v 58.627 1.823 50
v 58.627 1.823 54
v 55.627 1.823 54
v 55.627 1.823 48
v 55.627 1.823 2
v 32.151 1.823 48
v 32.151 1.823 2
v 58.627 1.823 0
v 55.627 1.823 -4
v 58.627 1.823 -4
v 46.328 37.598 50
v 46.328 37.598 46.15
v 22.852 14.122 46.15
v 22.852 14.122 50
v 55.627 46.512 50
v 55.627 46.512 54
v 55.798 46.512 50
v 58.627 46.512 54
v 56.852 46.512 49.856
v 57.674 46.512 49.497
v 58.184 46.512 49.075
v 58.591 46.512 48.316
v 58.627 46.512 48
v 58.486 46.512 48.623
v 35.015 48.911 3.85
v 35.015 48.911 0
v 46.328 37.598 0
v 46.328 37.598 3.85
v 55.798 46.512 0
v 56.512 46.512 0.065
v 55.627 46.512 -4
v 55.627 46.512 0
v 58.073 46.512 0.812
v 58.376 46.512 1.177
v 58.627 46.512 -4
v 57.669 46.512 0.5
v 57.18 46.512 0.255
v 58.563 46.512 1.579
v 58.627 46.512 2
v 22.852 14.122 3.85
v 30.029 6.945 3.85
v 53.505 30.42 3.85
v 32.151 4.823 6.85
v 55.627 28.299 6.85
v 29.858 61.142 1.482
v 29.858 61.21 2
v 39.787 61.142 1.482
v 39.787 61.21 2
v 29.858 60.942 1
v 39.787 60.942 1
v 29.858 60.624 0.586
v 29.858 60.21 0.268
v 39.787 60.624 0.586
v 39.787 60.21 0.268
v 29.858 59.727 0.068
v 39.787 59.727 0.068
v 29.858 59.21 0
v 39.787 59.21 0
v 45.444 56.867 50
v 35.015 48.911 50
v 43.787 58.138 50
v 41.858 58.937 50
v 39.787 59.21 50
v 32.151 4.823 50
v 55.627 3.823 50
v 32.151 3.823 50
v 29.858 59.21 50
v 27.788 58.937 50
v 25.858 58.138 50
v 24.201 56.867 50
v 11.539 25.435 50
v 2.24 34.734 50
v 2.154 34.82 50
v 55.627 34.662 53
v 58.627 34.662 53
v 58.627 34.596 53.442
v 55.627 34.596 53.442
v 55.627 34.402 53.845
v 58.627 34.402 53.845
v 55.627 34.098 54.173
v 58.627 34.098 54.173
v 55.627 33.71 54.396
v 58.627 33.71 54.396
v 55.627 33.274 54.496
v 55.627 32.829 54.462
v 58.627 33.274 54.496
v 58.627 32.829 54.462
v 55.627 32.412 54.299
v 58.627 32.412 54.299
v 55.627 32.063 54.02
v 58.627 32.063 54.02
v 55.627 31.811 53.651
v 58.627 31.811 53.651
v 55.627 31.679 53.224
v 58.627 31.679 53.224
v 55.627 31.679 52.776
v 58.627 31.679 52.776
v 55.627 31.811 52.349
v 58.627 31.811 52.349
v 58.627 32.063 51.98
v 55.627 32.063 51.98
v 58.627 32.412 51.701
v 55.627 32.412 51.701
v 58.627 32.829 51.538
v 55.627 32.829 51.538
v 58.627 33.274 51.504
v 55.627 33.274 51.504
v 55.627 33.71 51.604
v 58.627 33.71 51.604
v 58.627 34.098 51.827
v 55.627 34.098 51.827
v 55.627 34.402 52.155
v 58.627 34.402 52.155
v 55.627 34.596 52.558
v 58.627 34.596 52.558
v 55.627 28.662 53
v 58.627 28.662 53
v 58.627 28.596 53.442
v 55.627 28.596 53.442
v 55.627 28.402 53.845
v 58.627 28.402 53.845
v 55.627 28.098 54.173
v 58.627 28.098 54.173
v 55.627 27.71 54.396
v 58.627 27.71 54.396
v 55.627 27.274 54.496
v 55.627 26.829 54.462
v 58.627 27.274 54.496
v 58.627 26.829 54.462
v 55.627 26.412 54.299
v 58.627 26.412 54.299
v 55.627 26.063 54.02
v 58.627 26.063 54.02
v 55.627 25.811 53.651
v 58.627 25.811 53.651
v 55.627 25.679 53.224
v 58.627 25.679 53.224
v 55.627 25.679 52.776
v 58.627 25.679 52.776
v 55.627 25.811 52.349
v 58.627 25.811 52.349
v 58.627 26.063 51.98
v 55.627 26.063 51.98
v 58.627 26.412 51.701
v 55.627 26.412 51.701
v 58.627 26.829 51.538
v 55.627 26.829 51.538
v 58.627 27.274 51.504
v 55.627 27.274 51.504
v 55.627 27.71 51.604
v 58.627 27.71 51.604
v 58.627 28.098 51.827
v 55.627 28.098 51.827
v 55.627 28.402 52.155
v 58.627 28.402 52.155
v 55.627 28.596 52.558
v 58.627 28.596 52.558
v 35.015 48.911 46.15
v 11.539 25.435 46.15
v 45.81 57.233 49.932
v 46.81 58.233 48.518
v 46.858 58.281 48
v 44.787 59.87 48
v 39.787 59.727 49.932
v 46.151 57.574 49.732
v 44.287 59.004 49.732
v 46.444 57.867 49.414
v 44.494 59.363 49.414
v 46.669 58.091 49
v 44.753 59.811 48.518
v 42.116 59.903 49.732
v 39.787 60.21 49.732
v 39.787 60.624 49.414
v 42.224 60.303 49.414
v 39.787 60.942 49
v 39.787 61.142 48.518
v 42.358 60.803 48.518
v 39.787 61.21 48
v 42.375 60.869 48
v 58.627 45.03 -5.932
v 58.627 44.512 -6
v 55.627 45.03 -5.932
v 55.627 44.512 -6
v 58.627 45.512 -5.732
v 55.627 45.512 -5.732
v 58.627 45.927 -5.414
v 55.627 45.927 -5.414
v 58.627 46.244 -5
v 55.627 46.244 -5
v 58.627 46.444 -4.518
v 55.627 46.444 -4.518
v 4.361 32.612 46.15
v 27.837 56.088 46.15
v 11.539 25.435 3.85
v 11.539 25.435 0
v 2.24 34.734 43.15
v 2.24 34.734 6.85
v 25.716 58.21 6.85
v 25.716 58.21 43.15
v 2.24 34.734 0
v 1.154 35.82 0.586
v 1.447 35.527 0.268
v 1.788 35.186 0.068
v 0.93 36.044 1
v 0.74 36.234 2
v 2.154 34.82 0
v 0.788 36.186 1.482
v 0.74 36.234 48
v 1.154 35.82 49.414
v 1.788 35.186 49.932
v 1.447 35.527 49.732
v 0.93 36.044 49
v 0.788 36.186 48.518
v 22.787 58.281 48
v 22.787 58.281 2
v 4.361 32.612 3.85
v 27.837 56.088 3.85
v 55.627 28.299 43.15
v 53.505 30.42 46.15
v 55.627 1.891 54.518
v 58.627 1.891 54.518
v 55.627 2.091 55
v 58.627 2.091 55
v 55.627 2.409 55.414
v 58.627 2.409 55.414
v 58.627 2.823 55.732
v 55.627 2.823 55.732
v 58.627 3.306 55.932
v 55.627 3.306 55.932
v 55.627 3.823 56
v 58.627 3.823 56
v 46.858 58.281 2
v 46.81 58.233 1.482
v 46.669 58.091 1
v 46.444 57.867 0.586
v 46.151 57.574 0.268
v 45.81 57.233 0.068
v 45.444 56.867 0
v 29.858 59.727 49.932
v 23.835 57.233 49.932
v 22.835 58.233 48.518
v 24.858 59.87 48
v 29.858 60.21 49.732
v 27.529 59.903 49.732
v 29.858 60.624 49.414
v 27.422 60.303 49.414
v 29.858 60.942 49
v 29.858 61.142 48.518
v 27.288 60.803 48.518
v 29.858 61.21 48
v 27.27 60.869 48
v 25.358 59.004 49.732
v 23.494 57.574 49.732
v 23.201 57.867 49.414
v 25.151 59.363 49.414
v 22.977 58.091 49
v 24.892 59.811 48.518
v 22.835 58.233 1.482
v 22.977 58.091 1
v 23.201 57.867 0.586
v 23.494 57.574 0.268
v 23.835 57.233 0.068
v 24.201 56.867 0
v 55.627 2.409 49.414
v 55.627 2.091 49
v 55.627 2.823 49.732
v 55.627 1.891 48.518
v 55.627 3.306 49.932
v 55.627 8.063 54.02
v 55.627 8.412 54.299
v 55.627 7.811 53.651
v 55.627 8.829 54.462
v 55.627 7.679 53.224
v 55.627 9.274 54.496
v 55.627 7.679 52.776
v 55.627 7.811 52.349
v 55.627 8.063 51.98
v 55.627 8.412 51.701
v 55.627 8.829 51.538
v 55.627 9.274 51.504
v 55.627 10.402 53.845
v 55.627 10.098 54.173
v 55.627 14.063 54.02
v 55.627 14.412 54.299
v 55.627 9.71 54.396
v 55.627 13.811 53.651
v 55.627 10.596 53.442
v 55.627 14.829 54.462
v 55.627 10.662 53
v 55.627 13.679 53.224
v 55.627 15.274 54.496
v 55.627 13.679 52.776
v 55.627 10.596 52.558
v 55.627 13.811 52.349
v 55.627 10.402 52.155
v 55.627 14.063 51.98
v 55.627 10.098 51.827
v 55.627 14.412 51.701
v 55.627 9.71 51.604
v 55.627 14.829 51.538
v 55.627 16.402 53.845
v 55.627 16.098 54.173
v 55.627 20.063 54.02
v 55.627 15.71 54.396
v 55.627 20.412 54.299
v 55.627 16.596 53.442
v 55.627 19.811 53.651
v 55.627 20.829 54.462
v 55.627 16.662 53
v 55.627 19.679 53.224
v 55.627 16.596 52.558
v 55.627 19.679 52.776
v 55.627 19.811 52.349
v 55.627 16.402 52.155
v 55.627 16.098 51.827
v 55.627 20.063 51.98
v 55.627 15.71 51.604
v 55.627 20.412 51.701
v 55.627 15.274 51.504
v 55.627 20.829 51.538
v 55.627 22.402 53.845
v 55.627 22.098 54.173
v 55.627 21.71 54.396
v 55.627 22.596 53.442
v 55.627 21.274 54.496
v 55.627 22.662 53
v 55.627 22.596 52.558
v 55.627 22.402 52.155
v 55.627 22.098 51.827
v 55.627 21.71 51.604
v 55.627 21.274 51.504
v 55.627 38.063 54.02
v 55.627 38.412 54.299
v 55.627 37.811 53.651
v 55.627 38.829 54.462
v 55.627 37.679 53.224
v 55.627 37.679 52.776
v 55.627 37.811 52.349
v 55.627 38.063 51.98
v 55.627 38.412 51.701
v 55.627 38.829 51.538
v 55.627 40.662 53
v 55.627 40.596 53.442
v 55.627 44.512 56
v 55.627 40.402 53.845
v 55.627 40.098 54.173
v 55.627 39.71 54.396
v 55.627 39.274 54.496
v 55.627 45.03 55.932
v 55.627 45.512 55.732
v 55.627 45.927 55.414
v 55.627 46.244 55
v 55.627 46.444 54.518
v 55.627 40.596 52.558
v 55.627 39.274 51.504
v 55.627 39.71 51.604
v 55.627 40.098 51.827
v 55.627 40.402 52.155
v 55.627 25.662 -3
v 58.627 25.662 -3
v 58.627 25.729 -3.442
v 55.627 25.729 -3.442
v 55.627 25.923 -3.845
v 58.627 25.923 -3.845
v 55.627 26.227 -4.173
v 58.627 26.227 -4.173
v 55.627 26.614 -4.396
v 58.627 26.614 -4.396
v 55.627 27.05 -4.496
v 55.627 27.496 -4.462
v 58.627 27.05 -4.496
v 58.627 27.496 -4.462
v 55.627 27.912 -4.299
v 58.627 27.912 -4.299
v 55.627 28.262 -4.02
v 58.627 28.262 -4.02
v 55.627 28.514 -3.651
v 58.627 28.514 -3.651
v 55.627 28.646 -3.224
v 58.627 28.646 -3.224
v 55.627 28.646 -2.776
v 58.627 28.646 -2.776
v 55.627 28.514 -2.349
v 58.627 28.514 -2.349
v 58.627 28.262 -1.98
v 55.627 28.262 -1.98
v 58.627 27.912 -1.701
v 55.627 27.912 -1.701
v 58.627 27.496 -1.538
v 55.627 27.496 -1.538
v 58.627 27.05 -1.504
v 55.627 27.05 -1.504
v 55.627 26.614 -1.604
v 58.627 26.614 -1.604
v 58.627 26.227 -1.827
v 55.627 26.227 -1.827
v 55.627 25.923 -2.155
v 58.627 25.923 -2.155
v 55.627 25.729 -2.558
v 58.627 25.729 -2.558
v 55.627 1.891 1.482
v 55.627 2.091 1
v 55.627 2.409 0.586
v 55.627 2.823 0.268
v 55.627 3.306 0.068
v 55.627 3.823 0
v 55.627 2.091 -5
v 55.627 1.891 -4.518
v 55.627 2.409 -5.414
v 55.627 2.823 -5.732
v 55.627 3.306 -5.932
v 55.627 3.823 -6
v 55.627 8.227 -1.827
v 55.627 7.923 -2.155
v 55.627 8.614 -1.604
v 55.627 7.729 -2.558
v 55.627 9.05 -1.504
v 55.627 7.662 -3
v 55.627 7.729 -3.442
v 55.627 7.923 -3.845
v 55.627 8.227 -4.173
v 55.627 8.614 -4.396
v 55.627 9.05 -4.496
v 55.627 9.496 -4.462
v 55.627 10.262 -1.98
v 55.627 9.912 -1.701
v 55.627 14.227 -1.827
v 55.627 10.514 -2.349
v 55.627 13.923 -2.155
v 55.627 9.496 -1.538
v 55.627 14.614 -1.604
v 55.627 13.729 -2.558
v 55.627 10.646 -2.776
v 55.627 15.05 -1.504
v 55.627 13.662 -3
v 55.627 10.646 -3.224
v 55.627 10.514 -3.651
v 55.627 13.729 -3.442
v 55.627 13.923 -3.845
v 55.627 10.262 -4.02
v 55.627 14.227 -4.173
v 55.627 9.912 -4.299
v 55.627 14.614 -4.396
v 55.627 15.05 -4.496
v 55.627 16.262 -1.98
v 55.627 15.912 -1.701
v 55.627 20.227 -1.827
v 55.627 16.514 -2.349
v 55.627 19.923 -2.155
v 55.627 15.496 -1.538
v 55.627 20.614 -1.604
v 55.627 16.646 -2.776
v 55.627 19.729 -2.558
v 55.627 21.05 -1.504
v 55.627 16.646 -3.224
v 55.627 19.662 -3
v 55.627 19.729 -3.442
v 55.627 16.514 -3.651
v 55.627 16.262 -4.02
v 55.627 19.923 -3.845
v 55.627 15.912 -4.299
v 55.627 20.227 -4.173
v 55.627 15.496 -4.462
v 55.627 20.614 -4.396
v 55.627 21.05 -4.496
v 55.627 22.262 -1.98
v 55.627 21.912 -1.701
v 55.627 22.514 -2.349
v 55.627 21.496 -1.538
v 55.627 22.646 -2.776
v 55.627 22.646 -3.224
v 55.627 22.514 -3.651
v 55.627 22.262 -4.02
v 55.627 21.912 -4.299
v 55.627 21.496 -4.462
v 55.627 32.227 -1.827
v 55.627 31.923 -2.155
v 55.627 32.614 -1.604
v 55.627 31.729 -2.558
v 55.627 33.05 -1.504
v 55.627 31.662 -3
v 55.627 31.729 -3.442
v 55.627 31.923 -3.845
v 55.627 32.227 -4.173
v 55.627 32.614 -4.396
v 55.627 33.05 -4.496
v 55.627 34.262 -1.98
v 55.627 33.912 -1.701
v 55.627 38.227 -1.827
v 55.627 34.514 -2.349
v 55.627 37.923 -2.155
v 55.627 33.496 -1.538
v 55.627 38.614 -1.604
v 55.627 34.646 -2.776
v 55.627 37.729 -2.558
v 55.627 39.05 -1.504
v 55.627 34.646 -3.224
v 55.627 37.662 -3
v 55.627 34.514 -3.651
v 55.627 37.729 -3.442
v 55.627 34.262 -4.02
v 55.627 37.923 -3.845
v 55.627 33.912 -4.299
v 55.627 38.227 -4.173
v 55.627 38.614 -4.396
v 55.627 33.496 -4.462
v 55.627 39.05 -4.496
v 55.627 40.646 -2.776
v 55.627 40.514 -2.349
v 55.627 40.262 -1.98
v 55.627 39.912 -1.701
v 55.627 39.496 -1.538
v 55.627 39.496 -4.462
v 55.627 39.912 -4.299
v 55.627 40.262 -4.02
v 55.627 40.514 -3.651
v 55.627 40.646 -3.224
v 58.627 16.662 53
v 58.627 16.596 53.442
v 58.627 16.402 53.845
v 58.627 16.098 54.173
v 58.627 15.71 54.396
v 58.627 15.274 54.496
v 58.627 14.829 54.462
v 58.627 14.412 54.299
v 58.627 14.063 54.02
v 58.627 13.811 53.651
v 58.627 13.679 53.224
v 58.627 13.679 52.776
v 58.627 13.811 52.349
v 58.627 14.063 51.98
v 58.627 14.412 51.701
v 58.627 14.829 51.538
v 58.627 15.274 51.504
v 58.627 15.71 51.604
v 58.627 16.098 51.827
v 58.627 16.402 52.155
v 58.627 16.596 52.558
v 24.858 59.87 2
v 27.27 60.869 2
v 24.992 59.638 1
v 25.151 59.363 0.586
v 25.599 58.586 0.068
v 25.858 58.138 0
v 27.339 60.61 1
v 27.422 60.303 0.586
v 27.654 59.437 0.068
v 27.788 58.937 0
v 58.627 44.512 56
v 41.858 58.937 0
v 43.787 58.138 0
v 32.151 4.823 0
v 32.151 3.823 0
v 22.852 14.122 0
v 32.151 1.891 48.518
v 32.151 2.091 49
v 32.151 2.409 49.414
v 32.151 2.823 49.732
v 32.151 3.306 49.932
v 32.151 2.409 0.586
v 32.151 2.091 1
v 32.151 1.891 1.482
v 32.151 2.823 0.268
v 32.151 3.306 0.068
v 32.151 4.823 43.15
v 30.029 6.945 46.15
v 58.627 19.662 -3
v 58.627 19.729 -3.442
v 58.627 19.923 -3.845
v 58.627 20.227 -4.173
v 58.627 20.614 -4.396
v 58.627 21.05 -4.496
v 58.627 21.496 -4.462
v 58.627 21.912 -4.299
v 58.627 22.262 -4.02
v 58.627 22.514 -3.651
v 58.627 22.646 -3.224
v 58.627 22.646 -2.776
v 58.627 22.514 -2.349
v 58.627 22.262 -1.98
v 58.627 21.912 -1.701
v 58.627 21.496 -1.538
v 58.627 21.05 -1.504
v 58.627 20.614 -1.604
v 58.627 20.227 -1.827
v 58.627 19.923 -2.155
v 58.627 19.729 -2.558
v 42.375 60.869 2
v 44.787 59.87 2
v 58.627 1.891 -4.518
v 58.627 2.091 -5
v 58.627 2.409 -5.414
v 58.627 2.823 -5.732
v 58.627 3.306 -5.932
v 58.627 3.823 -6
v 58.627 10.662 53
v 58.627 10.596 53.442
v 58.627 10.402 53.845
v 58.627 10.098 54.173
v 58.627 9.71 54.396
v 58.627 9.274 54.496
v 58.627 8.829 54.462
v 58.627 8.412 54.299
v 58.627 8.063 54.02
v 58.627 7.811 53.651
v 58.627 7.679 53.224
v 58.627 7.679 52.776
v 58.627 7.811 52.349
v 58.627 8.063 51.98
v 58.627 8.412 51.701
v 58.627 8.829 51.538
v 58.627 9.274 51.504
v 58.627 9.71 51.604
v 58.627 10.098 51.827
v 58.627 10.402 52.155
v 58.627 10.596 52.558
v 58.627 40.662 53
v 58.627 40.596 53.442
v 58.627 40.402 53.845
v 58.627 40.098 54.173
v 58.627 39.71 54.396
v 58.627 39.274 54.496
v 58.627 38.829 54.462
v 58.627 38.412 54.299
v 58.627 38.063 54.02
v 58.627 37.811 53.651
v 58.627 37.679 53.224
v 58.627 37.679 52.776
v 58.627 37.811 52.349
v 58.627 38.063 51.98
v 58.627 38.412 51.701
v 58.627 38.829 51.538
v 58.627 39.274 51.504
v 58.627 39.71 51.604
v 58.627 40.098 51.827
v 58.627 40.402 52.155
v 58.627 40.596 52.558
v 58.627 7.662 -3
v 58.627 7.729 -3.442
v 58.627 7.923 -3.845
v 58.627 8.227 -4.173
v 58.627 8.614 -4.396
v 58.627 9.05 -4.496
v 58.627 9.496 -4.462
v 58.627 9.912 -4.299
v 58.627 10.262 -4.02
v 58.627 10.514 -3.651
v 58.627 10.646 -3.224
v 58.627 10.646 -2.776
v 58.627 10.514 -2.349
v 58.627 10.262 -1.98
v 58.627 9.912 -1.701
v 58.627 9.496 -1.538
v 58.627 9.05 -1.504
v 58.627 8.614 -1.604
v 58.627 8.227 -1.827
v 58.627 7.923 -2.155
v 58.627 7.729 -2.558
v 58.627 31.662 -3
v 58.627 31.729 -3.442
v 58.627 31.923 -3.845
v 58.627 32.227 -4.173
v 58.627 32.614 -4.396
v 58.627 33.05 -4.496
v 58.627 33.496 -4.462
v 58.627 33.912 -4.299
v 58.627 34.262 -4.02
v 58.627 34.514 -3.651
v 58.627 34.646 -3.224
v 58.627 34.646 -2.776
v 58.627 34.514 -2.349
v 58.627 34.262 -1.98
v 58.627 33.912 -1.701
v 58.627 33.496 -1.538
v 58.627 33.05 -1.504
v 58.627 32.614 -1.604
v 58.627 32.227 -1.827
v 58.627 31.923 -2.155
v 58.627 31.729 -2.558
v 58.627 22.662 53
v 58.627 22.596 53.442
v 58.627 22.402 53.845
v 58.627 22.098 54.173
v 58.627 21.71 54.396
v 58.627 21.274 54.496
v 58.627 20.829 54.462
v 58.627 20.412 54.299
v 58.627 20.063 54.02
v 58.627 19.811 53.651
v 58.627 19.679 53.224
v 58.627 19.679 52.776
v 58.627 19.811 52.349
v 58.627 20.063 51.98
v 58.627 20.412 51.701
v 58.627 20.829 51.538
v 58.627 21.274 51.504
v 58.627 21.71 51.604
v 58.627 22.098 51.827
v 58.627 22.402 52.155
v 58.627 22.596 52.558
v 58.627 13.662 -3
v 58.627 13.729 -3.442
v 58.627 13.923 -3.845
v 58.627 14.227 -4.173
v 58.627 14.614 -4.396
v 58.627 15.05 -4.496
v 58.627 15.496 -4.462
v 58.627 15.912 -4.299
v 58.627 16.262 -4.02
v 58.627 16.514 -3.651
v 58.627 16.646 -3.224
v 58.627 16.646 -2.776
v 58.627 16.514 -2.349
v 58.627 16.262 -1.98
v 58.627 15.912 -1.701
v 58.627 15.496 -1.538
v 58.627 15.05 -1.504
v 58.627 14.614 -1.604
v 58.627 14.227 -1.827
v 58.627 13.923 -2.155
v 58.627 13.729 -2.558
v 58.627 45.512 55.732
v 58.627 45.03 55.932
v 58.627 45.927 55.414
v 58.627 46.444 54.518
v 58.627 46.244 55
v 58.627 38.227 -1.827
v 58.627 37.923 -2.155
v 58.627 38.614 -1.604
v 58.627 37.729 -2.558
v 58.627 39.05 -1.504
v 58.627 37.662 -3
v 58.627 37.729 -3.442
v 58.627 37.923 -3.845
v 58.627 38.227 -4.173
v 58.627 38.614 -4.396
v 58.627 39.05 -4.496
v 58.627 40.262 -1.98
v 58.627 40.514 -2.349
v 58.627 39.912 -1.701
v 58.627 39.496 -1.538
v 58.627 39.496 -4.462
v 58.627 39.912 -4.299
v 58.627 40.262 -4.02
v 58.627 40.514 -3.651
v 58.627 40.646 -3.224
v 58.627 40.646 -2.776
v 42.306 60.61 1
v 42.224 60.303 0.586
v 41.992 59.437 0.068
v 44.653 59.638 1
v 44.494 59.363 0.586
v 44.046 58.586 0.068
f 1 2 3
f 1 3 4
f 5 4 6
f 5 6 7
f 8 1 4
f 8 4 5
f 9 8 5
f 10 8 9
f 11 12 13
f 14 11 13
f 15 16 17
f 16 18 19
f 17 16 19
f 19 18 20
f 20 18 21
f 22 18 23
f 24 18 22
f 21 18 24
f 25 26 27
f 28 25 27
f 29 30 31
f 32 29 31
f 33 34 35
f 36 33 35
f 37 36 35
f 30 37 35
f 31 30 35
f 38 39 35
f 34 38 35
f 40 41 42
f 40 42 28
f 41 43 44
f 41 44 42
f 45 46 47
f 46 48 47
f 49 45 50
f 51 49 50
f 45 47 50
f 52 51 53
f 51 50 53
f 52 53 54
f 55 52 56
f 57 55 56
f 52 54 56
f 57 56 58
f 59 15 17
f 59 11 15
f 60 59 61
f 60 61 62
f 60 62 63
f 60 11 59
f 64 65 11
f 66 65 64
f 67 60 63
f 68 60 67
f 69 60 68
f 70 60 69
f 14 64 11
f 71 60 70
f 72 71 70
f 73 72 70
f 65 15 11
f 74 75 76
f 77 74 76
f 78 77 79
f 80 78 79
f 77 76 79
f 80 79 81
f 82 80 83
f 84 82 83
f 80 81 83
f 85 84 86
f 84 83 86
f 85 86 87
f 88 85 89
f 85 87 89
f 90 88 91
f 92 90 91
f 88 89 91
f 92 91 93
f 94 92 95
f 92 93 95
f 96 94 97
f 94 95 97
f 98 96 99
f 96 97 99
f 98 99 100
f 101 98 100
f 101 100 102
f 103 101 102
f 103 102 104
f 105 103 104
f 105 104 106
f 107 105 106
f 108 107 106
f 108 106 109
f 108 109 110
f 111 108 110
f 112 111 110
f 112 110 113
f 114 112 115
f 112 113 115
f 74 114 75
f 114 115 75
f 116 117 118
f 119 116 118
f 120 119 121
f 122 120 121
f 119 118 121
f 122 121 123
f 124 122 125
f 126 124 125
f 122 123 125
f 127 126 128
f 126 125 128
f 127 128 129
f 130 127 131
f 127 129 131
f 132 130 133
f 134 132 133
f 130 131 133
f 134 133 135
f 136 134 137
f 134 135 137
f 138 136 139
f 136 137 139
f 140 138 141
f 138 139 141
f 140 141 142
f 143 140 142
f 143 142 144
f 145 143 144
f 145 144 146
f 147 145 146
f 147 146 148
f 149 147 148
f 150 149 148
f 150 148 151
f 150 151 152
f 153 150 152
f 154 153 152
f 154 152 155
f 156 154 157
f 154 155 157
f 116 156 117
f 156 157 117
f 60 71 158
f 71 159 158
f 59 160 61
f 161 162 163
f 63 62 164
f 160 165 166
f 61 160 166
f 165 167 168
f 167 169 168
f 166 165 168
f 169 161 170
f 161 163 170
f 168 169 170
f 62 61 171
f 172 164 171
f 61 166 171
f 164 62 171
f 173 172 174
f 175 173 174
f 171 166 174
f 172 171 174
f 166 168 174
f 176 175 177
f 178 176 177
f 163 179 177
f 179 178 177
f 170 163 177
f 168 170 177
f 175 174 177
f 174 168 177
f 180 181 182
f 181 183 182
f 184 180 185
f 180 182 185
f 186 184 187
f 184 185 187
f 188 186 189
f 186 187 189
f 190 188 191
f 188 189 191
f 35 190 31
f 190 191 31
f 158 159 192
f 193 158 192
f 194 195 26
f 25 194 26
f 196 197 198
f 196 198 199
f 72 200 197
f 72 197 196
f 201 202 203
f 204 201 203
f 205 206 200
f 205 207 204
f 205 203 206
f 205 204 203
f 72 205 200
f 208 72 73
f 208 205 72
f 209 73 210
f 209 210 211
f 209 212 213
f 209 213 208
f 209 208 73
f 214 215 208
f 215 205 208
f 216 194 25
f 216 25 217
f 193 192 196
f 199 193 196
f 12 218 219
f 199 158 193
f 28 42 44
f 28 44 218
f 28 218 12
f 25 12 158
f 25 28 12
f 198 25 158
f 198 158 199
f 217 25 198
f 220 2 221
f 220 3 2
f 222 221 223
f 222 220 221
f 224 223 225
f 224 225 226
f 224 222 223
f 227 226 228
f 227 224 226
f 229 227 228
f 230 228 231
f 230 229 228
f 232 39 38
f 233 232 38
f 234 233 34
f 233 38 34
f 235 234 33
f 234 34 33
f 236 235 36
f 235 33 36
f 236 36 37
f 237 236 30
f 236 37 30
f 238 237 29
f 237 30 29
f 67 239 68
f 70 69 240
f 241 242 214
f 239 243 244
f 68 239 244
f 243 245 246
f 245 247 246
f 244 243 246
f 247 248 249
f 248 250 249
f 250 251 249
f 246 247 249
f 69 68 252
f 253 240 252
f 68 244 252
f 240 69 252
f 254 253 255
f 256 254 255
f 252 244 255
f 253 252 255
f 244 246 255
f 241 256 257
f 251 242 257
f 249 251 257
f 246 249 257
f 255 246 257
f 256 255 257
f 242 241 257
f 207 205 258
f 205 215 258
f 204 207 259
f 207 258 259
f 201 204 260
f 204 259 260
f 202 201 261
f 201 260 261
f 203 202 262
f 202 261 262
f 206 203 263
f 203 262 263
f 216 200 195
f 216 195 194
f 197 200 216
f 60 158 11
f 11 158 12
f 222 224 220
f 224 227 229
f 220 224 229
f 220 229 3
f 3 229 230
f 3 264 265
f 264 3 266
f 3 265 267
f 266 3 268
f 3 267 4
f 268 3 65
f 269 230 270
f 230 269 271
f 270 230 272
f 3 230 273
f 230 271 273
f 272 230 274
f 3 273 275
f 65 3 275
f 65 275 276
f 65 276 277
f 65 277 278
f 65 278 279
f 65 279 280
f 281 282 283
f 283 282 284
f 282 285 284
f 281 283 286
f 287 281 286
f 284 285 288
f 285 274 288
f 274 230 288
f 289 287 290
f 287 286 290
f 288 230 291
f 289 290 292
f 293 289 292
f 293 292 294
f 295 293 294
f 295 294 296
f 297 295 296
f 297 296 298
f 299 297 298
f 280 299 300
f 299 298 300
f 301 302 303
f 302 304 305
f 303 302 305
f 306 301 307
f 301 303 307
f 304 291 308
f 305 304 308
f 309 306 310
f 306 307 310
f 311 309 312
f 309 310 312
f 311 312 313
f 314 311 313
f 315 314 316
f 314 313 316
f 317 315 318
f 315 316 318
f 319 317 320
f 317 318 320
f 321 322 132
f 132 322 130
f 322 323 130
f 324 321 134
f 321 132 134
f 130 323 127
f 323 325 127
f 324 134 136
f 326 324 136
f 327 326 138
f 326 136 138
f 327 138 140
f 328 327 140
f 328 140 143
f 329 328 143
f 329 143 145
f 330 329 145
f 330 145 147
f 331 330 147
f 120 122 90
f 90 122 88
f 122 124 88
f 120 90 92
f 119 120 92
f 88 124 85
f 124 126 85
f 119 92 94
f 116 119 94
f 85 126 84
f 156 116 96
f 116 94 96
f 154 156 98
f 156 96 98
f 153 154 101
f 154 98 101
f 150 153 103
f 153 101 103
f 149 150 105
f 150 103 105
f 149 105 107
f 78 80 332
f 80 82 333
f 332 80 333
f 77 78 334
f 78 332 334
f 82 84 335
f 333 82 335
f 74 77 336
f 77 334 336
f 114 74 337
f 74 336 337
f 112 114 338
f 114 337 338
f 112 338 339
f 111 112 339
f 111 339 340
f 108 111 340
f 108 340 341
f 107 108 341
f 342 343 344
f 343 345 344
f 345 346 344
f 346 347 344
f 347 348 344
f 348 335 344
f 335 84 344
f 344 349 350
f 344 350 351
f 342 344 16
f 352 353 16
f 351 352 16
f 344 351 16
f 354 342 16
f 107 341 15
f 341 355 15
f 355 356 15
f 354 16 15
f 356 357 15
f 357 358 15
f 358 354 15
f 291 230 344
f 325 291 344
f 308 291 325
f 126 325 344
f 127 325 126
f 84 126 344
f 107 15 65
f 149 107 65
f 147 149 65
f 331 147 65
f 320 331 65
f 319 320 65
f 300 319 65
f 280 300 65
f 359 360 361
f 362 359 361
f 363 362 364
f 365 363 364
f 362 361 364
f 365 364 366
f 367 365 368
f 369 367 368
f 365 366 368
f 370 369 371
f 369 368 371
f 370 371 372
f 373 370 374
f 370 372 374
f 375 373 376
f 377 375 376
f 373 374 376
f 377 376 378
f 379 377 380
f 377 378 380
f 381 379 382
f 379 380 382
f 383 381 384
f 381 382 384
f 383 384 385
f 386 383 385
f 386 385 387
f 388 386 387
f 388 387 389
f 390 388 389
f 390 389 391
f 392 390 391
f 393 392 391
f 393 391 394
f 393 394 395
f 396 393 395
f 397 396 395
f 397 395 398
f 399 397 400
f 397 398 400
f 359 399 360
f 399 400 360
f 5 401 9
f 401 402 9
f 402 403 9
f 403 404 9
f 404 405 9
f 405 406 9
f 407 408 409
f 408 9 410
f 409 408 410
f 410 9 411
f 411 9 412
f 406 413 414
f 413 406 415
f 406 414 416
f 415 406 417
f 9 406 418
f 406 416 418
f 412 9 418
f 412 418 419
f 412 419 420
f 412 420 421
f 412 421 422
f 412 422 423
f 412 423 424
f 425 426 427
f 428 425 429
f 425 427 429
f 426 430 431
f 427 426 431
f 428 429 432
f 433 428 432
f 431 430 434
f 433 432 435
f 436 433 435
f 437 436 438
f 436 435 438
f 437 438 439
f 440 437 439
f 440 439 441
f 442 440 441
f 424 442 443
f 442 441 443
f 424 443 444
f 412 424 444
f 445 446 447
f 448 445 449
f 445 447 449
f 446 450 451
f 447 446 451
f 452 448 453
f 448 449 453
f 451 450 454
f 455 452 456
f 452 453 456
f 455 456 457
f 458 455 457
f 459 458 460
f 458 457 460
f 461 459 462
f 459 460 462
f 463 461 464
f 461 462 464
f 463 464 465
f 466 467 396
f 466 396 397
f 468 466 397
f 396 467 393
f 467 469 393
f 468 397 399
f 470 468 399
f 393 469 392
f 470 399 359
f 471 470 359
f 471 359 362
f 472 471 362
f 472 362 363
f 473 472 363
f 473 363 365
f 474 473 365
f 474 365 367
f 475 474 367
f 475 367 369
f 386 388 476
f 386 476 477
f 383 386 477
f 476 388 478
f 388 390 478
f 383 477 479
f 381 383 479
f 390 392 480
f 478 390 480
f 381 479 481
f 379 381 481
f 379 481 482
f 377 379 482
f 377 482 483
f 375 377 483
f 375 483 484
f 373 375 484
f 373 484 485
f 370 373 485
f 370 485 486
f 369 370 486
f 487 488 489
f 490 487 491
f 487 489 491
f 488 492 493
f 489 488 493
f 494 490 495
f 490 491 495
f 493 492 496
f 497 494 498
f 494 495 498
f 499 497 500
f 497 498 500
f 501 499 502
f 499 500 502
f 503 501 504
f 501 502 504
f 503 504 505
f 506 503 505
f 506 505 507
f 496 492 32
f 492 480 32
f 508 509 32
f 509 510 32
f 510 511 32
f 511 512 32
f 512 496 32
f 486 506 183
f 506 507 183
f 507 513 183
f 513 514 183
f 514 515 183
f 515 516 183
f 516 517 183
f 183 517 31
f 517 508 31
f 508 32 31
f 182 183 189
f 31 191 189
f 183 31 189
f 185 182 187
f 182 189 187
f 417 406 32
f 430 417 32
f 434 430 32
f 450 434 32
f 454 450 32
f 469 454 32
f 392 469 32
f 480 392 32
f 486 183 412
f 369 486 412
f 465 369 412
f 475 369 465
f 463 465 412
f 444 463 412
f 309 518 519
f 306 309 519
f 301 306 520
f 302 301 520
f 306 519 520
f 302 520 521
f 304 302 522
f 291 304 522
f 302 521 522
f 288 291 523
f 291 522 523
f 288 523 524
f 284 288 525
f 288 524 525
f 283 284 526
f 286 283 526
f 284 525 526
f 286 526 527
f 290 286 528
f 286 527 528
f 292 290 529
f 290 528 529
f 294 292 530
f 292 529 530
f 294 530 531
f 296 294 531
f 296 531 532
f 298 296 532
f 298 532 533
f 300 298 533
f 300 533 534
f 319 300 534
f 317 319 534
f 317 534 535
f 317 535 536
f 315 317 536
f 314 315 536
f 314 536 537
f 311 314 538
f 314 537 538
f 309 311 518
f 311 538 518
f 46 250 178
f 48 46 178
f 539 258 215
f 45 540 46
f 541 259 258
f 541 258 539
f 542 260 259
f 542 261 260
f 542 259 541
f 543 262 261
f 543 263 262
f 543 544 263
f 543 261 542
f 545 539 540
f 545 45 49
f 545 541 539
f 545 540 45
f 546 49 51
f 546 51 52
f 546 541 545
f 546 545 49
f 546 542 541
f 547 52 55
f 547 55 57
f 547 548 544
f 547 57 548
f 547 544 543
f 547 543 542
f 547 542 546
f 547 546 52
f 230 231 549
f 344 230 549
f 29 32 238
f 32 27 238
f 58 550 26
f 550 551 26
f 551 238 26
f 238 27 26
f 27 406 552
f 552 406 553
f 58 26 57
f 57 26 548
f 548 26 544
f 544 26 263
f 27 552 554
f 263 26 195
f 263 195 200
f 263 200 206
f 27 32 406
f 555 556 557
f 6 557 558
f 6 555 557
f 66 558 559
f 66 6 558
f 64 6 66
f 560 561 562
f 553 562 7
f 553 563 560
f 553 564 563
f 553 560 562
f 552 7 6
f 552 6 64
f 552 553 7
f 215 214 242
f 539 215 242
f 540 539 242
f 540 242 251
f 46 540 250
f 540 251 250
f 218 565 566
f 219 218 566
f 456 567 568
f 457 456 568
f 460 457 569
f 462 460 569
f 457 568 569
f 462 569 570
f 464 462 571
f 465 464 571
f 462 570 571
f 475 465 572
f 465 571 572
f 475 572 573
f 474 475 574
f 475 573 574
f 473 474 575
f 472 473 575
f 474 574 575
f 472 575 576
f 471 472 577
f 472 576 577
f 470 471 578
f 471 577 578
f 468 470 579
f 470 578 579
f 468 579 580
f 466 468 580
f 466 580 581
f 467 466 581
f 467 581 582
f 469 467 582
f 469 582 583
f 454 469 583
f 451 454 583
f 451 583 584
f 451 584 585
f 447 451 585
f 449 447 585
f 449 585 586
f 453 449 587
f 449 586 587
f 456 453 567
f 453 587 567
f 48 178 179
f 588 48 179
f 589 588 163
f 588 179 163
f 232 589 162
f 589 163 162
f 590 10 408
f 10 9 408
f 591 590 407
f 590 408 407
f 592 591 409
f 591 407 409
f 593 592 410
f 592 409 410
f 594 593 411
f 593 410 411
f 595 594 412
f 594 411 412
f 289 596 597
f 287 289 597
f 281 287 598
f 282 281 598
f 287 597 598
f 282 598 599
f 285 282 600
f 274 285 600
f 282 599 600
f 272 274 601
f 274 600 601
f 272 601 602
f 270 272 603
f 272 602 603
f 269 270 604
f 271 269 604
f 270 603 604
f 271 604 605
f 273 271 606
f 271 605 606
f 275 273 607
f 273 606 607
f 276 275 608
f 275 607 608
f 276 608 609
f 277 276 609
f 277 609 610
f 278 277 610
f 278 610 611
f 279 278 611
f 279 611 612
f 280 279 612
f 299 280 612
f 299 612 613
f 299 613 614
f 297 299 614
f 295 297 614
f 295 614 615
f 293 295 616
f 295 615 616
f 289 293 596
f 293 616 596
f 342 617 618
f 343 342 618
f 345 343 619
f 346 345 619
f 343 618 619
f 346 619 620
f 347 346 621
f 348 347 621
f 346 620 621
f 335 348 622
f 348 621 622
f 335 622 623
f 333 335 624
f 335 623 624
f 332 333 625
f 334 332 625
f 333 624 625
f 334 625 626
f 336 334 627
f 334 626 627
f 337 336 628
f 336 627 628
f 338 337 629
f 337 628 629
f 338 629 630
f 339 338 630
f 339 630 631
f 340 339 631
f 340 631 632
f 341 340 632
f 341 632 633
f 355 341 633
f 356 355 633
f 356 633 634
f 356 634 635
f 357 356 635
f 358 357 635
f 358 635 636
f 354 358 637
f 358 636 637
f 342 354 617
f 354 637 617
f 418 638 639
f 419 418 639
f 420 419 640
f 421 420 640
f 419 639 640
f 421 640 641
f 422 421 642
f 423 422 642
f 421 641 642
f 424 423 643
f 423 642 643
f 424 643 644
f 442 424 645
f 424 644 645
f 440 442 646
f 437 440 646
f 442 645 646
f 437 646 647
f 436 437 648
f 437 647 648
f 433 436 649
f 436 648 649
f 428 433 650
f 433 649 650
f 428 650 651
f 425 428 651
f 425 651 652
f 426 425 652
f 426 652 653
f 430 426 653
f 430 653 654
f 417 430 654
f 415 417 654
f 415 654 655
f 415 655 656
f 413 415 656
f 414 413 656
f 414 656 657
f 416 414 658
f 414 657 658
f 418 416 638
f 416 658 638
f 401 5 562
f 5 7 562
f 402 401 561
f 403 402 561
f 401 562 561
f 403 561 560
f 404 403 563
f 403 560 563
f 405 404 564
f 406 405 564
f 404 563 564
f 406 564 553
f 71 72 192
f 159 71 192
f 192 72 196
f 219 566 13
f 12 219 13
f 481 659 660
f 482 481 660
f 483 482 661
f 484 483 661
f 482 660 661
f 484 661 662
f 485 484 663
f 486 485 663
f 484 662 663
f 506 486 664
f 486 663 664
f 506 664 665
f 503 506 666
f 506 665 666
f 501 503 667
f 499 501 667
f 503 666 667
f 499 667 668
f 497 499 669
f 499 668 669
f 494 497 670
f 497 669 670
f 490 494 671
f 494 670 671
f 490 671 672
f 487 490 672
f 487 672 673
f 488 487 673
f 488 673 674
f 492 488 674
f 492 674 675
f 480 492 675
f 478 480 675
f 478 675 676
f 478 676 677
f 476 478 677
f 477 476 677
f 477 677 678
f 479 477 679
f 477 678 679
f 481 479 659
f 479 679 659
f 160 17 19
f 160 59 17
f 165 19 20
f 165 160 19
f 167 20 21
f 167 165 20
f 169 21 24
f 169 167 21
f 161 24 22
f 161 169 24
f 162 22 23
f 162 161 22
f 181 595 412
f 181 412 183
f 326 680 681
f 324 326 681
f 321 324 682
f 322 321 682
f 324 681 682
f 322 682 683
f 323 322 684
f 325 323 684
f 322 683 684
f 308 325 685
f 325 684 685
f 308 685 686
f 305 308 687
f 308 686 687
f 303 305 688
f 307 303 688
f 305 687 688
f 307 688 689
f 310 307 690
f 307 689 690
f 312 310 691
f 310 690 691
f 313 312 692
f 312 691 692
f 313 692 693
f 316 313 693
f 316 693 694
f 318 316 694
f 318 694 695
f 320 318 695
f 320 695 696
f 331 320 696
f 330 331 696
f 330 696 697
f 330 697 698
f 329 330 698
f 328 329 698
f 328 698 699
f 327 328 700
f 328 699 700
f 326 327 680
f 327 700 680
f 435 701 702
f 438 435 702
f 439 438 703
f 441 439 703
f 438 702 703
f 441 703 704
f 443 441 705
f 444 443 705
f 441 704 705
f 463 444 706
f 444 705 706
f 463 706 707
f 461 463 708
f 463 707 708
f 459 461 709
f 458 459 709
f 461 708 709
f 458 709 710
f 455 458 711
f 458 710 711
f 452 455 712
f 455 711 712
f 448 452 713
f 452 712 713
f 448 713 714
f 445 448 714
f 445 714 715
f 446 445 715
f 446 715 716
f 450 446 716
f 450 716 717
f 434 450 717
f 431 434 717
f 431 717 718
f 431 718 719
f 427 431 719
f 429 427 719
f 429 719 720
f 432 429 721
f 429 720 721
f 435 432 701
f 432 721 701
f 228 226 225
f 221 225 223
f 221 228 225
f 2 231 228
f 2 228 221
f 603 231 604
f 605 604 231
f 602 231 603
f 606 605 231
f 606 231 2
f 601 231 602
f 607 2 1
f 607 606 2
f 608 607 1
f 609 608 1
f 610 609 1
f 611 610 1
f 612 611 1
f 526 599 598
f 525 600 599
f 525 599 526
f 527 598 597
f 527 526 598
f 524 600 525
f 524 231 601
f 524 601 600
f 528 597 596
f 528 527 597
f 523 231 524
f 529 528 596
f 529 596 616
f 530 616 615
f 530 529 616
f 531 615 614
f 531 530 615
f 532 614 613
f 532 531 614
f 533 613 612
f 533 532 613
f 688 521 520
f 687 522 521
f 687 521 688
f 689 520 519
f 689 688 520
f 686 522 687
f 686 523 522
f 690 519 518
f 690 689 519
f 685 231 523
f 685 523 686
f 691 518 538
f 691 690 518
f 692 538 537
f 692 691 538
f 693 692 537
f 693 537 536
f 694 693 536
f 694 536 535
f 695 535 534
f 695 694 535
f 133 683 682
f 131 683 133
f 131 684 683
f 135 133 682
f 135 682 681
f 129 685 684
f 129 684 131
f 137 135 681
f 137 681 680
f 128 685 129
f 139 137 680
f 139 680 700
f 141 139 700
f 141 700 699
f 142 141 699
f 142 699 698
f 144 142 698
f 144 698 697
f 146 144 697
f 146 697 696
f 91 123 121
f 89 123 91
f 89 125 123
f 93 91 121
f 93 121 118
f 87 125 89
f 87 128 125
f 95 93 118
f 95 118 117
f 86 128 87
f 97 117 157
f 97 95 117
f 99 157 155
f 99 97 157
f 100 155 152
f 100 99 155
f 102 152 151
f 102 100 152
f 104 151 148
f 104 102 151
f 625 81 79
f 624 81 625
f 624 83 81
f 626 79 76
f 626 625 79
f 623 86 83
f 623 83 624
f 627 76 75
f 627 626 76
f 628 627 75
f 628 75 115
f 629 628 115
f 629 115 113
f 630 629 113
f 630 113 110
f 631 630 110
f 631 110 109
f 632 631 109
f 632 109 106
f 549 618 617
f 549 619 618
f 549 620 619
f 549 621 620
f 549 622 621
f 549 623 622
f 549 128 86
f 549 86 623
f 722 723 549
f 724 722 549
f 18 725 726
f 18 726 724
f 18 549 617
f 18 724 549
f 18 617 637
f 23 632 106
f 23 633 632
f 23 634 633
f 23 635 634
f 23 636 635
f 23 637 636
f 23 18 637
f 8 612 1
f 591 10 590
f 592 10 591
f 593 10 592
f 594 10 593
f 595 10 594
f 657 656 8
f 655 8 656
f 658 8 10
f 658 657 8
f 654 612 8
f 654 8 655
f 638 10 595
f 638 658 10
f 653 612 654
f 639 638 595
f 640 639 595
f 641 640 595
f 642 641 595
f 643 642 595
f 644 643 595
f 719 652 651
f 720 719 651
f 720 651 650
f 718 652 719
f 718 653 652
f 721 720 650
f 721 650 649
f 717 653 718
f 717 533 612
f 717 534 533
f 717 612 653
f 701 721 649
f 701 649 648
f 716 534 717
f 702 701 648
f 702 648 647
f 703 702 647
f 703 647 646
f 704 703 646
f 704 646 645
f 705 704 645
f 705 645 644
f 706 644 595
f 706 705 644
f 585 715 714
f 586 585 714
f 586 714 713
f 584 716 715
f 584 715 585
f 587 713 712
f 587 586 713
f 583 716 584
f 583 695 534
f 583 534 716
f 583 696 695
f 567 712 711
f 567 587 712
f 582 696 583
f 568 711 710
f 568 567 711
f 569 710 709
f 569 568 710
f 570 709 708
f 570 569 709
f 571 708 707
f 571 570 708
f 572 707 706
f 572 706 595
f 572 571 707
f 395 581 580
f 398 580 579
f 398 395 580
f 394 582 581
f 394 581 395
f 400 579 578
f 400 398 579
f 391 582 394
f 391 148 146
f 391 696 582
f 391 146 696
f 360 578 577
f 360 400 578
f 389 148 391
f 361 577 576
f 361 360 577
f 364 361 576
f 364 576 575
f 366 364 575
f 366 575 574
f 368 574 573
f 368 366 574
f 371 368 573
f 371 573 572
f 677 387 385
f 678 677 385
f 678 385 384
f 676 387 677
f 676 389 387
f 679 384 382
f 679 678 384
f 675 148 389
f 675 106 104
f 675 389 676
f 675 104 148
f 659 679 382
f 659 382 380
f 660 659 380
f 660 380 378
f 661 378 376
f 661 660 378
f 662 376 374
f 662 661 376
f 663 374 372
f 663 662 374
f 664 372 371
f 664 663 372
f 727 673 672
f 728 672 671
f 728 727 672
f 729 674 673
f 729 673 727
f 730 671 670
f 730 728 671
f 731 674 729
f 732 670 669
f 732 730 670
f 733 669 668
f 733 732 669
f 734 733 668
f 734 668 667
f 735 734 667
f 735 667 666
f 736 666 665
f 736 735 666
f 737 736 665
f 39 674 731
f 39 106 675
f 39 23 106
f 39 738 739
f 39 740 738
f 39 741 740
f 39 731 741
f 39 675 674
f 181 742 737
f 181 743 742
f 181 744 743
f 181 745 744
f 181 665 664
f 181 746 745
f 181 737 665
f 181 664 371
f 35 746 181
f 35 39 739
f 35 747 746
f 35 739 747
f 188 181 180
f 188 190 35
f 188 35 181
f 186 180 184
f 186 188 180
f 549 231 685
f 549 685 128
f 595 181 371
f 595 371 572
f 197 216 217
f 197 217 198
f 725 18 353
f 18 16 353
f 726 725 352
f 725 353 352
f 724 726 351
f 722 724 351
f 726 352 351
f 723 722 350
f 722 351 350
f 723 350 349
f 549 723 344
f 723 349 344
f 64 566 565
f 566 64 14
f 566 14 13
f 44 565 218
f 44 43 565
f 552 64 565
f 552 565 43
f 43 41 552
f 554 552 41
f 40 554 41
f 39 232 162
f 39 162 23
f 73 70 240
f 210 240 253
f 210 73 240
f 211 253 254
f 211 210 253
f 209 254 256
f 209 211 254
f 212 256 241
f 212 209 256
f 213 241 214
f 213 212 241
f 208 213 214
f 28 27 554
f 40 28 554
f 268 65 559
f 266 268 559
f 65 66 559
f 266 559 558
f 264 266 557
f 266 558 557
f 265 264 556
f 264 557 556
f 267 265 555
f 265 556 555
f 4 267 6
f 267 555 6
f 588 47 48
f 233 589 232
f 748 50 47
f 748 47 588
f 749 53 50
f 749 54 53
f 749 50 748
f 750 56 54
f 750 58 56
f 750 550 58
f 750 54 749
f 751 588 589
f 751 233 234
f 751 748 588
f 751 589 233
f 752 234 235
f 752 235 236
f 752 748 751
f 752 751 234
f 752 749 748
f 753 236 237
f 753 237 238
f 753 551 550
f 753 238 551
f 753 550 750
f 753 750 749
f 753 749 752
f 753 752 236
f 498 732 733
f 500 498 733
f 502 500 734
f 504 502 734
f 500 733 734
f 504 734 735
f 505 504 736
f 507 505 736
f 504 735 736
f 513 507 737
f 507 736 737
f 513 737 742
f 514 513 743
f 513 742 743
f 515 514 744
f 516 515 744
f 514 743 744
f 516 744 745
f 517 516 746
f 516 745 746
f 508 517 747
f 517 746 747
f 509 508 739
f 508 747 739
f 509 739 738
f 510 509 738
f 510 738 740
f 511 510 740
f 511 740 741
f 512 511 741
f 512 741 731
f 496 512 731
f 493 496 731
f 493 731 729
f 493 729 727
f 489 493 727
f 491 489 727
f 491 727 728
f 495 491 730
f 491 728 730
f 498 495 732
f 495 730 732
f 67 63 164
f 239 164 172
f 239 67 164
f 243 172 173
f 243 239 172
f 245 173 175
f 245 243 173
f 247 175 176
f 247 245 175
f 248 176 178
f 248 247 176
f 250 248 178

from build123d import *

# Parameters (mm, degrees)
EXTRUDE_1_DEPTH     = 50
EXTRUDE_3_DEPTH     = 33.199998
EXTRUDE_4_REACH     = 79.048
SKETCH_4_W          = 50
SKETCH_4_H          = 2.121320344
CUT_EXTRUDE_1_DEPTH = 99.405896905
SKETCH_8_W          = 62
SKETCH_8_H          = 44.689148571
SKETCH_8_R          = 1.5
EXTRUDE_5_DEPTH     = 3
FILLET_1_R          = 10
FILLET_2_R          = 2


with BuildPart() as part:
    # 草图1 → 凸台-拉伸1 (new body)
    with BuildSketch(Plane.XY):
        Polygon((25.716046069, 61.209761814), (43.929249505, 61.209761814), (58.626662914, 46.512348406), (58.626662914, 1.823199835), (32.150717778, 1.823199835), (32.150717778, 4.823199835), (55.626662914, 28.29914497), (25.716046069, 58.209761814), align=None)
    extrude(amount=EXTRUDE_1_DEPTH)

    # 草图3 → 凸台-拉伸3 (add)
    with BuildSketch(Plane(origin=(41.962903942, 41.962903942, 0), x_dir=(0, 0, 1), z_dir=(-0.7071067811865476, -0.7071067811865476, 0))):
        Polygon((50, -19.323473251), (46.15, -19.323473251), (43.15, -19.323473251), (46.15, -16.323473251), (46.15, 19.976526749), (43.15, 22.976526749), (46.15, 22.976526749), (50, 22.976526749), align=None)
        Polygon((0, 22.976526749), (0, -19.323473251), (3.85, -19.323473251), (6.85, -19.323473251), (3.85, -16.323473251), (3.85, 19.976526749), (6.85, 22.976526749), (3.85, 22.976526749), align=None)
    extrude(amount=EXTRUDE_3_DEPTH)

    # 凸台-拉伸4: up to this plane
    extrude_4_end = Plane(origin=(25.716046069, 61.209761814, 50), z_dir=(0, -1, 0))
    # 草图4 → 凸台-拉伸4 (add, up to the surface)
    with BuildSketch(Plane(origin=(18.486958806, 18.486958806, 0), x_dir=(0, 0, 1), z_dir=(-0.7071067811865477, -0.7071067811865475, 0)), mode=Mode.PRIVATE) as extrude_4_sk1:
        with Locations((25, 24.037186921)):
            Rectangle(SKETCH_4_W, SKETCH_4_H)
    extrude_4_tool1 = split(extrude(extrude_4_sk1.sketch, amount=-EXTRUDE_4_REACH, mode=Mode.PRIVATE), bisect_by=extrude_4_end, keep=Keep.BOTH, mode=Mode.PRIVATE)
    add(extrude_4_tool1.solids().sort_by_distance((1.490101, 35.483817, 25))[0])

    # 草图5 → 切除-拉伸1 (cut, through all)
    with BuildSketch(Plane(origin=(0, 0, 0), x_dir=(-1, 0, 0), z_dir=(0, 0, -1))):
        Polygon((-35.014500242, 48.911307642), (-46.328208741, 37.597599143), (-22.852263606, 14.121654007), (-11.538555107, 25.435362506), align=None)
    extrude(amount=-CUT_EXTRUDE_1_DEPTH, mode=Mode.SUBTRACT)

    # 草图8 → 凸台-拉伸5 (add)
    with BuildSketch(Plane(origin=(58.626662914, 0, 0), x_dir=(0, 0, -1), z_dir=(1, 0, 0))):
        with Locations((-25, 24.16777412)):
            Rectangle(SKETCH_8_W, SKETCH_8_H)
        with Locations(Location((-53, 39.162348406, 0), (0, 0, 90))):
            Circle(SKETCH_8_R, mode=Mode.SUBTRACT)
        with Locations(Location((-53, 33.162348406, 0), (0, 0, 90))):
            Circle(SKETCH_8_R, mode=Mode.SUBTRACT)
        with Locations(Location((-53, 27.162348406, 0), (0, 0, 90))):
            Circle(SKETCH_8_R, mode=Mode.SUBTRACT)
        with Locations(Location((-53, 21.162348406, 0), (0, 0, 90))):
            Circle(SKETCH_8_R, mode=Mode.SUBTRACT)
        with Locations(Location((-53, 15.162348406, 0), (0, 0, 90))):
            Circle(SKETCH_8_R, mode=Mode.SUBTRACT)
        with Locations(Location((-53, 9.162348406, 0), (0, 0, 90))):
            Circle(SKETCH_8_R, mode=Mode.SUBTRACT)
        with Locations(Location((3, 9.162348406, 0), (0, 0, 270))):
            Circle(SKETCH_8_R, mode=Mode.SUBTRACT)
        with Locations(Location((3, 15.162348406, 0), (0, 0, 270))):
            Circle(SKETCH_8_R, mode=Mode.SUBTRACT)
        with Locations(Location((3, 21.162348406, 0), (0, 0, 270))):
            Circle(SKETCH_8_R, mode=Mode.SUBTRACT)
        with Locations(Location((3, 27.162348406, 0), (0, 0, 270))):
            Circle(SKETCH_8_R, mode=Mode.SUBTRACT)
        with Locations(Location((3, 33.162348406, 0), (0, 0, 270))):
            Circle(SKETCH_8_R, mode=Mode.SUBTRACT)
        with Locations(Location((3, 39.162348406, 0), (0, 0, 270))):
            Circle(SKETCH_8_R, mode=Mode.SUBTRACT)
    extrude(amount=-EXTRUDE_5_DEPTH)

    # 圆角1
    fillet_1_edges = [part.edges().sort_by_distance(p)[0] for p in [
        (25.716046069, 61.209761814, 25),
        (43.929249505, 61.209761814, 25),
    ]]
    fillet(fillet_1_edges, radius=FILLET_1_R)

    # 圆角2
    fillet_2_edges = [part.edges().sort_by_distance(p)[0] for p in [
        (52.742422303, 52.396589016, 0),
        (57.126662914, 1.823199835, -6),
        (57.126662914, 1.823199835, 56),
        (57.126662914, 46.512348406, 56),
        (57.126662914, 46.512348406, -6),
        (34.822647787, 61.209761814, 0),
        (34.822647787, 61.209761814, 50),
        (11.763607408, 47.257323152, 0),
        (26.031347369, 60.448557139, 0),
        (43.613948205, 60.448557139, 0),
        (11.763607408, 47.257323152, 50),
        (26.031347369, 60.448557139, 50),
        (43.613948205, 60.448557139, 50),
        (43.888690346, 1.823199835, 50),
        (43.888690346, 1.823199835, 0),
        (52.742422303, 52.396589016, 50),
    ]]
    fillet(fillet_2_edges, radius=FILLET_2_R)


solid = part.part
